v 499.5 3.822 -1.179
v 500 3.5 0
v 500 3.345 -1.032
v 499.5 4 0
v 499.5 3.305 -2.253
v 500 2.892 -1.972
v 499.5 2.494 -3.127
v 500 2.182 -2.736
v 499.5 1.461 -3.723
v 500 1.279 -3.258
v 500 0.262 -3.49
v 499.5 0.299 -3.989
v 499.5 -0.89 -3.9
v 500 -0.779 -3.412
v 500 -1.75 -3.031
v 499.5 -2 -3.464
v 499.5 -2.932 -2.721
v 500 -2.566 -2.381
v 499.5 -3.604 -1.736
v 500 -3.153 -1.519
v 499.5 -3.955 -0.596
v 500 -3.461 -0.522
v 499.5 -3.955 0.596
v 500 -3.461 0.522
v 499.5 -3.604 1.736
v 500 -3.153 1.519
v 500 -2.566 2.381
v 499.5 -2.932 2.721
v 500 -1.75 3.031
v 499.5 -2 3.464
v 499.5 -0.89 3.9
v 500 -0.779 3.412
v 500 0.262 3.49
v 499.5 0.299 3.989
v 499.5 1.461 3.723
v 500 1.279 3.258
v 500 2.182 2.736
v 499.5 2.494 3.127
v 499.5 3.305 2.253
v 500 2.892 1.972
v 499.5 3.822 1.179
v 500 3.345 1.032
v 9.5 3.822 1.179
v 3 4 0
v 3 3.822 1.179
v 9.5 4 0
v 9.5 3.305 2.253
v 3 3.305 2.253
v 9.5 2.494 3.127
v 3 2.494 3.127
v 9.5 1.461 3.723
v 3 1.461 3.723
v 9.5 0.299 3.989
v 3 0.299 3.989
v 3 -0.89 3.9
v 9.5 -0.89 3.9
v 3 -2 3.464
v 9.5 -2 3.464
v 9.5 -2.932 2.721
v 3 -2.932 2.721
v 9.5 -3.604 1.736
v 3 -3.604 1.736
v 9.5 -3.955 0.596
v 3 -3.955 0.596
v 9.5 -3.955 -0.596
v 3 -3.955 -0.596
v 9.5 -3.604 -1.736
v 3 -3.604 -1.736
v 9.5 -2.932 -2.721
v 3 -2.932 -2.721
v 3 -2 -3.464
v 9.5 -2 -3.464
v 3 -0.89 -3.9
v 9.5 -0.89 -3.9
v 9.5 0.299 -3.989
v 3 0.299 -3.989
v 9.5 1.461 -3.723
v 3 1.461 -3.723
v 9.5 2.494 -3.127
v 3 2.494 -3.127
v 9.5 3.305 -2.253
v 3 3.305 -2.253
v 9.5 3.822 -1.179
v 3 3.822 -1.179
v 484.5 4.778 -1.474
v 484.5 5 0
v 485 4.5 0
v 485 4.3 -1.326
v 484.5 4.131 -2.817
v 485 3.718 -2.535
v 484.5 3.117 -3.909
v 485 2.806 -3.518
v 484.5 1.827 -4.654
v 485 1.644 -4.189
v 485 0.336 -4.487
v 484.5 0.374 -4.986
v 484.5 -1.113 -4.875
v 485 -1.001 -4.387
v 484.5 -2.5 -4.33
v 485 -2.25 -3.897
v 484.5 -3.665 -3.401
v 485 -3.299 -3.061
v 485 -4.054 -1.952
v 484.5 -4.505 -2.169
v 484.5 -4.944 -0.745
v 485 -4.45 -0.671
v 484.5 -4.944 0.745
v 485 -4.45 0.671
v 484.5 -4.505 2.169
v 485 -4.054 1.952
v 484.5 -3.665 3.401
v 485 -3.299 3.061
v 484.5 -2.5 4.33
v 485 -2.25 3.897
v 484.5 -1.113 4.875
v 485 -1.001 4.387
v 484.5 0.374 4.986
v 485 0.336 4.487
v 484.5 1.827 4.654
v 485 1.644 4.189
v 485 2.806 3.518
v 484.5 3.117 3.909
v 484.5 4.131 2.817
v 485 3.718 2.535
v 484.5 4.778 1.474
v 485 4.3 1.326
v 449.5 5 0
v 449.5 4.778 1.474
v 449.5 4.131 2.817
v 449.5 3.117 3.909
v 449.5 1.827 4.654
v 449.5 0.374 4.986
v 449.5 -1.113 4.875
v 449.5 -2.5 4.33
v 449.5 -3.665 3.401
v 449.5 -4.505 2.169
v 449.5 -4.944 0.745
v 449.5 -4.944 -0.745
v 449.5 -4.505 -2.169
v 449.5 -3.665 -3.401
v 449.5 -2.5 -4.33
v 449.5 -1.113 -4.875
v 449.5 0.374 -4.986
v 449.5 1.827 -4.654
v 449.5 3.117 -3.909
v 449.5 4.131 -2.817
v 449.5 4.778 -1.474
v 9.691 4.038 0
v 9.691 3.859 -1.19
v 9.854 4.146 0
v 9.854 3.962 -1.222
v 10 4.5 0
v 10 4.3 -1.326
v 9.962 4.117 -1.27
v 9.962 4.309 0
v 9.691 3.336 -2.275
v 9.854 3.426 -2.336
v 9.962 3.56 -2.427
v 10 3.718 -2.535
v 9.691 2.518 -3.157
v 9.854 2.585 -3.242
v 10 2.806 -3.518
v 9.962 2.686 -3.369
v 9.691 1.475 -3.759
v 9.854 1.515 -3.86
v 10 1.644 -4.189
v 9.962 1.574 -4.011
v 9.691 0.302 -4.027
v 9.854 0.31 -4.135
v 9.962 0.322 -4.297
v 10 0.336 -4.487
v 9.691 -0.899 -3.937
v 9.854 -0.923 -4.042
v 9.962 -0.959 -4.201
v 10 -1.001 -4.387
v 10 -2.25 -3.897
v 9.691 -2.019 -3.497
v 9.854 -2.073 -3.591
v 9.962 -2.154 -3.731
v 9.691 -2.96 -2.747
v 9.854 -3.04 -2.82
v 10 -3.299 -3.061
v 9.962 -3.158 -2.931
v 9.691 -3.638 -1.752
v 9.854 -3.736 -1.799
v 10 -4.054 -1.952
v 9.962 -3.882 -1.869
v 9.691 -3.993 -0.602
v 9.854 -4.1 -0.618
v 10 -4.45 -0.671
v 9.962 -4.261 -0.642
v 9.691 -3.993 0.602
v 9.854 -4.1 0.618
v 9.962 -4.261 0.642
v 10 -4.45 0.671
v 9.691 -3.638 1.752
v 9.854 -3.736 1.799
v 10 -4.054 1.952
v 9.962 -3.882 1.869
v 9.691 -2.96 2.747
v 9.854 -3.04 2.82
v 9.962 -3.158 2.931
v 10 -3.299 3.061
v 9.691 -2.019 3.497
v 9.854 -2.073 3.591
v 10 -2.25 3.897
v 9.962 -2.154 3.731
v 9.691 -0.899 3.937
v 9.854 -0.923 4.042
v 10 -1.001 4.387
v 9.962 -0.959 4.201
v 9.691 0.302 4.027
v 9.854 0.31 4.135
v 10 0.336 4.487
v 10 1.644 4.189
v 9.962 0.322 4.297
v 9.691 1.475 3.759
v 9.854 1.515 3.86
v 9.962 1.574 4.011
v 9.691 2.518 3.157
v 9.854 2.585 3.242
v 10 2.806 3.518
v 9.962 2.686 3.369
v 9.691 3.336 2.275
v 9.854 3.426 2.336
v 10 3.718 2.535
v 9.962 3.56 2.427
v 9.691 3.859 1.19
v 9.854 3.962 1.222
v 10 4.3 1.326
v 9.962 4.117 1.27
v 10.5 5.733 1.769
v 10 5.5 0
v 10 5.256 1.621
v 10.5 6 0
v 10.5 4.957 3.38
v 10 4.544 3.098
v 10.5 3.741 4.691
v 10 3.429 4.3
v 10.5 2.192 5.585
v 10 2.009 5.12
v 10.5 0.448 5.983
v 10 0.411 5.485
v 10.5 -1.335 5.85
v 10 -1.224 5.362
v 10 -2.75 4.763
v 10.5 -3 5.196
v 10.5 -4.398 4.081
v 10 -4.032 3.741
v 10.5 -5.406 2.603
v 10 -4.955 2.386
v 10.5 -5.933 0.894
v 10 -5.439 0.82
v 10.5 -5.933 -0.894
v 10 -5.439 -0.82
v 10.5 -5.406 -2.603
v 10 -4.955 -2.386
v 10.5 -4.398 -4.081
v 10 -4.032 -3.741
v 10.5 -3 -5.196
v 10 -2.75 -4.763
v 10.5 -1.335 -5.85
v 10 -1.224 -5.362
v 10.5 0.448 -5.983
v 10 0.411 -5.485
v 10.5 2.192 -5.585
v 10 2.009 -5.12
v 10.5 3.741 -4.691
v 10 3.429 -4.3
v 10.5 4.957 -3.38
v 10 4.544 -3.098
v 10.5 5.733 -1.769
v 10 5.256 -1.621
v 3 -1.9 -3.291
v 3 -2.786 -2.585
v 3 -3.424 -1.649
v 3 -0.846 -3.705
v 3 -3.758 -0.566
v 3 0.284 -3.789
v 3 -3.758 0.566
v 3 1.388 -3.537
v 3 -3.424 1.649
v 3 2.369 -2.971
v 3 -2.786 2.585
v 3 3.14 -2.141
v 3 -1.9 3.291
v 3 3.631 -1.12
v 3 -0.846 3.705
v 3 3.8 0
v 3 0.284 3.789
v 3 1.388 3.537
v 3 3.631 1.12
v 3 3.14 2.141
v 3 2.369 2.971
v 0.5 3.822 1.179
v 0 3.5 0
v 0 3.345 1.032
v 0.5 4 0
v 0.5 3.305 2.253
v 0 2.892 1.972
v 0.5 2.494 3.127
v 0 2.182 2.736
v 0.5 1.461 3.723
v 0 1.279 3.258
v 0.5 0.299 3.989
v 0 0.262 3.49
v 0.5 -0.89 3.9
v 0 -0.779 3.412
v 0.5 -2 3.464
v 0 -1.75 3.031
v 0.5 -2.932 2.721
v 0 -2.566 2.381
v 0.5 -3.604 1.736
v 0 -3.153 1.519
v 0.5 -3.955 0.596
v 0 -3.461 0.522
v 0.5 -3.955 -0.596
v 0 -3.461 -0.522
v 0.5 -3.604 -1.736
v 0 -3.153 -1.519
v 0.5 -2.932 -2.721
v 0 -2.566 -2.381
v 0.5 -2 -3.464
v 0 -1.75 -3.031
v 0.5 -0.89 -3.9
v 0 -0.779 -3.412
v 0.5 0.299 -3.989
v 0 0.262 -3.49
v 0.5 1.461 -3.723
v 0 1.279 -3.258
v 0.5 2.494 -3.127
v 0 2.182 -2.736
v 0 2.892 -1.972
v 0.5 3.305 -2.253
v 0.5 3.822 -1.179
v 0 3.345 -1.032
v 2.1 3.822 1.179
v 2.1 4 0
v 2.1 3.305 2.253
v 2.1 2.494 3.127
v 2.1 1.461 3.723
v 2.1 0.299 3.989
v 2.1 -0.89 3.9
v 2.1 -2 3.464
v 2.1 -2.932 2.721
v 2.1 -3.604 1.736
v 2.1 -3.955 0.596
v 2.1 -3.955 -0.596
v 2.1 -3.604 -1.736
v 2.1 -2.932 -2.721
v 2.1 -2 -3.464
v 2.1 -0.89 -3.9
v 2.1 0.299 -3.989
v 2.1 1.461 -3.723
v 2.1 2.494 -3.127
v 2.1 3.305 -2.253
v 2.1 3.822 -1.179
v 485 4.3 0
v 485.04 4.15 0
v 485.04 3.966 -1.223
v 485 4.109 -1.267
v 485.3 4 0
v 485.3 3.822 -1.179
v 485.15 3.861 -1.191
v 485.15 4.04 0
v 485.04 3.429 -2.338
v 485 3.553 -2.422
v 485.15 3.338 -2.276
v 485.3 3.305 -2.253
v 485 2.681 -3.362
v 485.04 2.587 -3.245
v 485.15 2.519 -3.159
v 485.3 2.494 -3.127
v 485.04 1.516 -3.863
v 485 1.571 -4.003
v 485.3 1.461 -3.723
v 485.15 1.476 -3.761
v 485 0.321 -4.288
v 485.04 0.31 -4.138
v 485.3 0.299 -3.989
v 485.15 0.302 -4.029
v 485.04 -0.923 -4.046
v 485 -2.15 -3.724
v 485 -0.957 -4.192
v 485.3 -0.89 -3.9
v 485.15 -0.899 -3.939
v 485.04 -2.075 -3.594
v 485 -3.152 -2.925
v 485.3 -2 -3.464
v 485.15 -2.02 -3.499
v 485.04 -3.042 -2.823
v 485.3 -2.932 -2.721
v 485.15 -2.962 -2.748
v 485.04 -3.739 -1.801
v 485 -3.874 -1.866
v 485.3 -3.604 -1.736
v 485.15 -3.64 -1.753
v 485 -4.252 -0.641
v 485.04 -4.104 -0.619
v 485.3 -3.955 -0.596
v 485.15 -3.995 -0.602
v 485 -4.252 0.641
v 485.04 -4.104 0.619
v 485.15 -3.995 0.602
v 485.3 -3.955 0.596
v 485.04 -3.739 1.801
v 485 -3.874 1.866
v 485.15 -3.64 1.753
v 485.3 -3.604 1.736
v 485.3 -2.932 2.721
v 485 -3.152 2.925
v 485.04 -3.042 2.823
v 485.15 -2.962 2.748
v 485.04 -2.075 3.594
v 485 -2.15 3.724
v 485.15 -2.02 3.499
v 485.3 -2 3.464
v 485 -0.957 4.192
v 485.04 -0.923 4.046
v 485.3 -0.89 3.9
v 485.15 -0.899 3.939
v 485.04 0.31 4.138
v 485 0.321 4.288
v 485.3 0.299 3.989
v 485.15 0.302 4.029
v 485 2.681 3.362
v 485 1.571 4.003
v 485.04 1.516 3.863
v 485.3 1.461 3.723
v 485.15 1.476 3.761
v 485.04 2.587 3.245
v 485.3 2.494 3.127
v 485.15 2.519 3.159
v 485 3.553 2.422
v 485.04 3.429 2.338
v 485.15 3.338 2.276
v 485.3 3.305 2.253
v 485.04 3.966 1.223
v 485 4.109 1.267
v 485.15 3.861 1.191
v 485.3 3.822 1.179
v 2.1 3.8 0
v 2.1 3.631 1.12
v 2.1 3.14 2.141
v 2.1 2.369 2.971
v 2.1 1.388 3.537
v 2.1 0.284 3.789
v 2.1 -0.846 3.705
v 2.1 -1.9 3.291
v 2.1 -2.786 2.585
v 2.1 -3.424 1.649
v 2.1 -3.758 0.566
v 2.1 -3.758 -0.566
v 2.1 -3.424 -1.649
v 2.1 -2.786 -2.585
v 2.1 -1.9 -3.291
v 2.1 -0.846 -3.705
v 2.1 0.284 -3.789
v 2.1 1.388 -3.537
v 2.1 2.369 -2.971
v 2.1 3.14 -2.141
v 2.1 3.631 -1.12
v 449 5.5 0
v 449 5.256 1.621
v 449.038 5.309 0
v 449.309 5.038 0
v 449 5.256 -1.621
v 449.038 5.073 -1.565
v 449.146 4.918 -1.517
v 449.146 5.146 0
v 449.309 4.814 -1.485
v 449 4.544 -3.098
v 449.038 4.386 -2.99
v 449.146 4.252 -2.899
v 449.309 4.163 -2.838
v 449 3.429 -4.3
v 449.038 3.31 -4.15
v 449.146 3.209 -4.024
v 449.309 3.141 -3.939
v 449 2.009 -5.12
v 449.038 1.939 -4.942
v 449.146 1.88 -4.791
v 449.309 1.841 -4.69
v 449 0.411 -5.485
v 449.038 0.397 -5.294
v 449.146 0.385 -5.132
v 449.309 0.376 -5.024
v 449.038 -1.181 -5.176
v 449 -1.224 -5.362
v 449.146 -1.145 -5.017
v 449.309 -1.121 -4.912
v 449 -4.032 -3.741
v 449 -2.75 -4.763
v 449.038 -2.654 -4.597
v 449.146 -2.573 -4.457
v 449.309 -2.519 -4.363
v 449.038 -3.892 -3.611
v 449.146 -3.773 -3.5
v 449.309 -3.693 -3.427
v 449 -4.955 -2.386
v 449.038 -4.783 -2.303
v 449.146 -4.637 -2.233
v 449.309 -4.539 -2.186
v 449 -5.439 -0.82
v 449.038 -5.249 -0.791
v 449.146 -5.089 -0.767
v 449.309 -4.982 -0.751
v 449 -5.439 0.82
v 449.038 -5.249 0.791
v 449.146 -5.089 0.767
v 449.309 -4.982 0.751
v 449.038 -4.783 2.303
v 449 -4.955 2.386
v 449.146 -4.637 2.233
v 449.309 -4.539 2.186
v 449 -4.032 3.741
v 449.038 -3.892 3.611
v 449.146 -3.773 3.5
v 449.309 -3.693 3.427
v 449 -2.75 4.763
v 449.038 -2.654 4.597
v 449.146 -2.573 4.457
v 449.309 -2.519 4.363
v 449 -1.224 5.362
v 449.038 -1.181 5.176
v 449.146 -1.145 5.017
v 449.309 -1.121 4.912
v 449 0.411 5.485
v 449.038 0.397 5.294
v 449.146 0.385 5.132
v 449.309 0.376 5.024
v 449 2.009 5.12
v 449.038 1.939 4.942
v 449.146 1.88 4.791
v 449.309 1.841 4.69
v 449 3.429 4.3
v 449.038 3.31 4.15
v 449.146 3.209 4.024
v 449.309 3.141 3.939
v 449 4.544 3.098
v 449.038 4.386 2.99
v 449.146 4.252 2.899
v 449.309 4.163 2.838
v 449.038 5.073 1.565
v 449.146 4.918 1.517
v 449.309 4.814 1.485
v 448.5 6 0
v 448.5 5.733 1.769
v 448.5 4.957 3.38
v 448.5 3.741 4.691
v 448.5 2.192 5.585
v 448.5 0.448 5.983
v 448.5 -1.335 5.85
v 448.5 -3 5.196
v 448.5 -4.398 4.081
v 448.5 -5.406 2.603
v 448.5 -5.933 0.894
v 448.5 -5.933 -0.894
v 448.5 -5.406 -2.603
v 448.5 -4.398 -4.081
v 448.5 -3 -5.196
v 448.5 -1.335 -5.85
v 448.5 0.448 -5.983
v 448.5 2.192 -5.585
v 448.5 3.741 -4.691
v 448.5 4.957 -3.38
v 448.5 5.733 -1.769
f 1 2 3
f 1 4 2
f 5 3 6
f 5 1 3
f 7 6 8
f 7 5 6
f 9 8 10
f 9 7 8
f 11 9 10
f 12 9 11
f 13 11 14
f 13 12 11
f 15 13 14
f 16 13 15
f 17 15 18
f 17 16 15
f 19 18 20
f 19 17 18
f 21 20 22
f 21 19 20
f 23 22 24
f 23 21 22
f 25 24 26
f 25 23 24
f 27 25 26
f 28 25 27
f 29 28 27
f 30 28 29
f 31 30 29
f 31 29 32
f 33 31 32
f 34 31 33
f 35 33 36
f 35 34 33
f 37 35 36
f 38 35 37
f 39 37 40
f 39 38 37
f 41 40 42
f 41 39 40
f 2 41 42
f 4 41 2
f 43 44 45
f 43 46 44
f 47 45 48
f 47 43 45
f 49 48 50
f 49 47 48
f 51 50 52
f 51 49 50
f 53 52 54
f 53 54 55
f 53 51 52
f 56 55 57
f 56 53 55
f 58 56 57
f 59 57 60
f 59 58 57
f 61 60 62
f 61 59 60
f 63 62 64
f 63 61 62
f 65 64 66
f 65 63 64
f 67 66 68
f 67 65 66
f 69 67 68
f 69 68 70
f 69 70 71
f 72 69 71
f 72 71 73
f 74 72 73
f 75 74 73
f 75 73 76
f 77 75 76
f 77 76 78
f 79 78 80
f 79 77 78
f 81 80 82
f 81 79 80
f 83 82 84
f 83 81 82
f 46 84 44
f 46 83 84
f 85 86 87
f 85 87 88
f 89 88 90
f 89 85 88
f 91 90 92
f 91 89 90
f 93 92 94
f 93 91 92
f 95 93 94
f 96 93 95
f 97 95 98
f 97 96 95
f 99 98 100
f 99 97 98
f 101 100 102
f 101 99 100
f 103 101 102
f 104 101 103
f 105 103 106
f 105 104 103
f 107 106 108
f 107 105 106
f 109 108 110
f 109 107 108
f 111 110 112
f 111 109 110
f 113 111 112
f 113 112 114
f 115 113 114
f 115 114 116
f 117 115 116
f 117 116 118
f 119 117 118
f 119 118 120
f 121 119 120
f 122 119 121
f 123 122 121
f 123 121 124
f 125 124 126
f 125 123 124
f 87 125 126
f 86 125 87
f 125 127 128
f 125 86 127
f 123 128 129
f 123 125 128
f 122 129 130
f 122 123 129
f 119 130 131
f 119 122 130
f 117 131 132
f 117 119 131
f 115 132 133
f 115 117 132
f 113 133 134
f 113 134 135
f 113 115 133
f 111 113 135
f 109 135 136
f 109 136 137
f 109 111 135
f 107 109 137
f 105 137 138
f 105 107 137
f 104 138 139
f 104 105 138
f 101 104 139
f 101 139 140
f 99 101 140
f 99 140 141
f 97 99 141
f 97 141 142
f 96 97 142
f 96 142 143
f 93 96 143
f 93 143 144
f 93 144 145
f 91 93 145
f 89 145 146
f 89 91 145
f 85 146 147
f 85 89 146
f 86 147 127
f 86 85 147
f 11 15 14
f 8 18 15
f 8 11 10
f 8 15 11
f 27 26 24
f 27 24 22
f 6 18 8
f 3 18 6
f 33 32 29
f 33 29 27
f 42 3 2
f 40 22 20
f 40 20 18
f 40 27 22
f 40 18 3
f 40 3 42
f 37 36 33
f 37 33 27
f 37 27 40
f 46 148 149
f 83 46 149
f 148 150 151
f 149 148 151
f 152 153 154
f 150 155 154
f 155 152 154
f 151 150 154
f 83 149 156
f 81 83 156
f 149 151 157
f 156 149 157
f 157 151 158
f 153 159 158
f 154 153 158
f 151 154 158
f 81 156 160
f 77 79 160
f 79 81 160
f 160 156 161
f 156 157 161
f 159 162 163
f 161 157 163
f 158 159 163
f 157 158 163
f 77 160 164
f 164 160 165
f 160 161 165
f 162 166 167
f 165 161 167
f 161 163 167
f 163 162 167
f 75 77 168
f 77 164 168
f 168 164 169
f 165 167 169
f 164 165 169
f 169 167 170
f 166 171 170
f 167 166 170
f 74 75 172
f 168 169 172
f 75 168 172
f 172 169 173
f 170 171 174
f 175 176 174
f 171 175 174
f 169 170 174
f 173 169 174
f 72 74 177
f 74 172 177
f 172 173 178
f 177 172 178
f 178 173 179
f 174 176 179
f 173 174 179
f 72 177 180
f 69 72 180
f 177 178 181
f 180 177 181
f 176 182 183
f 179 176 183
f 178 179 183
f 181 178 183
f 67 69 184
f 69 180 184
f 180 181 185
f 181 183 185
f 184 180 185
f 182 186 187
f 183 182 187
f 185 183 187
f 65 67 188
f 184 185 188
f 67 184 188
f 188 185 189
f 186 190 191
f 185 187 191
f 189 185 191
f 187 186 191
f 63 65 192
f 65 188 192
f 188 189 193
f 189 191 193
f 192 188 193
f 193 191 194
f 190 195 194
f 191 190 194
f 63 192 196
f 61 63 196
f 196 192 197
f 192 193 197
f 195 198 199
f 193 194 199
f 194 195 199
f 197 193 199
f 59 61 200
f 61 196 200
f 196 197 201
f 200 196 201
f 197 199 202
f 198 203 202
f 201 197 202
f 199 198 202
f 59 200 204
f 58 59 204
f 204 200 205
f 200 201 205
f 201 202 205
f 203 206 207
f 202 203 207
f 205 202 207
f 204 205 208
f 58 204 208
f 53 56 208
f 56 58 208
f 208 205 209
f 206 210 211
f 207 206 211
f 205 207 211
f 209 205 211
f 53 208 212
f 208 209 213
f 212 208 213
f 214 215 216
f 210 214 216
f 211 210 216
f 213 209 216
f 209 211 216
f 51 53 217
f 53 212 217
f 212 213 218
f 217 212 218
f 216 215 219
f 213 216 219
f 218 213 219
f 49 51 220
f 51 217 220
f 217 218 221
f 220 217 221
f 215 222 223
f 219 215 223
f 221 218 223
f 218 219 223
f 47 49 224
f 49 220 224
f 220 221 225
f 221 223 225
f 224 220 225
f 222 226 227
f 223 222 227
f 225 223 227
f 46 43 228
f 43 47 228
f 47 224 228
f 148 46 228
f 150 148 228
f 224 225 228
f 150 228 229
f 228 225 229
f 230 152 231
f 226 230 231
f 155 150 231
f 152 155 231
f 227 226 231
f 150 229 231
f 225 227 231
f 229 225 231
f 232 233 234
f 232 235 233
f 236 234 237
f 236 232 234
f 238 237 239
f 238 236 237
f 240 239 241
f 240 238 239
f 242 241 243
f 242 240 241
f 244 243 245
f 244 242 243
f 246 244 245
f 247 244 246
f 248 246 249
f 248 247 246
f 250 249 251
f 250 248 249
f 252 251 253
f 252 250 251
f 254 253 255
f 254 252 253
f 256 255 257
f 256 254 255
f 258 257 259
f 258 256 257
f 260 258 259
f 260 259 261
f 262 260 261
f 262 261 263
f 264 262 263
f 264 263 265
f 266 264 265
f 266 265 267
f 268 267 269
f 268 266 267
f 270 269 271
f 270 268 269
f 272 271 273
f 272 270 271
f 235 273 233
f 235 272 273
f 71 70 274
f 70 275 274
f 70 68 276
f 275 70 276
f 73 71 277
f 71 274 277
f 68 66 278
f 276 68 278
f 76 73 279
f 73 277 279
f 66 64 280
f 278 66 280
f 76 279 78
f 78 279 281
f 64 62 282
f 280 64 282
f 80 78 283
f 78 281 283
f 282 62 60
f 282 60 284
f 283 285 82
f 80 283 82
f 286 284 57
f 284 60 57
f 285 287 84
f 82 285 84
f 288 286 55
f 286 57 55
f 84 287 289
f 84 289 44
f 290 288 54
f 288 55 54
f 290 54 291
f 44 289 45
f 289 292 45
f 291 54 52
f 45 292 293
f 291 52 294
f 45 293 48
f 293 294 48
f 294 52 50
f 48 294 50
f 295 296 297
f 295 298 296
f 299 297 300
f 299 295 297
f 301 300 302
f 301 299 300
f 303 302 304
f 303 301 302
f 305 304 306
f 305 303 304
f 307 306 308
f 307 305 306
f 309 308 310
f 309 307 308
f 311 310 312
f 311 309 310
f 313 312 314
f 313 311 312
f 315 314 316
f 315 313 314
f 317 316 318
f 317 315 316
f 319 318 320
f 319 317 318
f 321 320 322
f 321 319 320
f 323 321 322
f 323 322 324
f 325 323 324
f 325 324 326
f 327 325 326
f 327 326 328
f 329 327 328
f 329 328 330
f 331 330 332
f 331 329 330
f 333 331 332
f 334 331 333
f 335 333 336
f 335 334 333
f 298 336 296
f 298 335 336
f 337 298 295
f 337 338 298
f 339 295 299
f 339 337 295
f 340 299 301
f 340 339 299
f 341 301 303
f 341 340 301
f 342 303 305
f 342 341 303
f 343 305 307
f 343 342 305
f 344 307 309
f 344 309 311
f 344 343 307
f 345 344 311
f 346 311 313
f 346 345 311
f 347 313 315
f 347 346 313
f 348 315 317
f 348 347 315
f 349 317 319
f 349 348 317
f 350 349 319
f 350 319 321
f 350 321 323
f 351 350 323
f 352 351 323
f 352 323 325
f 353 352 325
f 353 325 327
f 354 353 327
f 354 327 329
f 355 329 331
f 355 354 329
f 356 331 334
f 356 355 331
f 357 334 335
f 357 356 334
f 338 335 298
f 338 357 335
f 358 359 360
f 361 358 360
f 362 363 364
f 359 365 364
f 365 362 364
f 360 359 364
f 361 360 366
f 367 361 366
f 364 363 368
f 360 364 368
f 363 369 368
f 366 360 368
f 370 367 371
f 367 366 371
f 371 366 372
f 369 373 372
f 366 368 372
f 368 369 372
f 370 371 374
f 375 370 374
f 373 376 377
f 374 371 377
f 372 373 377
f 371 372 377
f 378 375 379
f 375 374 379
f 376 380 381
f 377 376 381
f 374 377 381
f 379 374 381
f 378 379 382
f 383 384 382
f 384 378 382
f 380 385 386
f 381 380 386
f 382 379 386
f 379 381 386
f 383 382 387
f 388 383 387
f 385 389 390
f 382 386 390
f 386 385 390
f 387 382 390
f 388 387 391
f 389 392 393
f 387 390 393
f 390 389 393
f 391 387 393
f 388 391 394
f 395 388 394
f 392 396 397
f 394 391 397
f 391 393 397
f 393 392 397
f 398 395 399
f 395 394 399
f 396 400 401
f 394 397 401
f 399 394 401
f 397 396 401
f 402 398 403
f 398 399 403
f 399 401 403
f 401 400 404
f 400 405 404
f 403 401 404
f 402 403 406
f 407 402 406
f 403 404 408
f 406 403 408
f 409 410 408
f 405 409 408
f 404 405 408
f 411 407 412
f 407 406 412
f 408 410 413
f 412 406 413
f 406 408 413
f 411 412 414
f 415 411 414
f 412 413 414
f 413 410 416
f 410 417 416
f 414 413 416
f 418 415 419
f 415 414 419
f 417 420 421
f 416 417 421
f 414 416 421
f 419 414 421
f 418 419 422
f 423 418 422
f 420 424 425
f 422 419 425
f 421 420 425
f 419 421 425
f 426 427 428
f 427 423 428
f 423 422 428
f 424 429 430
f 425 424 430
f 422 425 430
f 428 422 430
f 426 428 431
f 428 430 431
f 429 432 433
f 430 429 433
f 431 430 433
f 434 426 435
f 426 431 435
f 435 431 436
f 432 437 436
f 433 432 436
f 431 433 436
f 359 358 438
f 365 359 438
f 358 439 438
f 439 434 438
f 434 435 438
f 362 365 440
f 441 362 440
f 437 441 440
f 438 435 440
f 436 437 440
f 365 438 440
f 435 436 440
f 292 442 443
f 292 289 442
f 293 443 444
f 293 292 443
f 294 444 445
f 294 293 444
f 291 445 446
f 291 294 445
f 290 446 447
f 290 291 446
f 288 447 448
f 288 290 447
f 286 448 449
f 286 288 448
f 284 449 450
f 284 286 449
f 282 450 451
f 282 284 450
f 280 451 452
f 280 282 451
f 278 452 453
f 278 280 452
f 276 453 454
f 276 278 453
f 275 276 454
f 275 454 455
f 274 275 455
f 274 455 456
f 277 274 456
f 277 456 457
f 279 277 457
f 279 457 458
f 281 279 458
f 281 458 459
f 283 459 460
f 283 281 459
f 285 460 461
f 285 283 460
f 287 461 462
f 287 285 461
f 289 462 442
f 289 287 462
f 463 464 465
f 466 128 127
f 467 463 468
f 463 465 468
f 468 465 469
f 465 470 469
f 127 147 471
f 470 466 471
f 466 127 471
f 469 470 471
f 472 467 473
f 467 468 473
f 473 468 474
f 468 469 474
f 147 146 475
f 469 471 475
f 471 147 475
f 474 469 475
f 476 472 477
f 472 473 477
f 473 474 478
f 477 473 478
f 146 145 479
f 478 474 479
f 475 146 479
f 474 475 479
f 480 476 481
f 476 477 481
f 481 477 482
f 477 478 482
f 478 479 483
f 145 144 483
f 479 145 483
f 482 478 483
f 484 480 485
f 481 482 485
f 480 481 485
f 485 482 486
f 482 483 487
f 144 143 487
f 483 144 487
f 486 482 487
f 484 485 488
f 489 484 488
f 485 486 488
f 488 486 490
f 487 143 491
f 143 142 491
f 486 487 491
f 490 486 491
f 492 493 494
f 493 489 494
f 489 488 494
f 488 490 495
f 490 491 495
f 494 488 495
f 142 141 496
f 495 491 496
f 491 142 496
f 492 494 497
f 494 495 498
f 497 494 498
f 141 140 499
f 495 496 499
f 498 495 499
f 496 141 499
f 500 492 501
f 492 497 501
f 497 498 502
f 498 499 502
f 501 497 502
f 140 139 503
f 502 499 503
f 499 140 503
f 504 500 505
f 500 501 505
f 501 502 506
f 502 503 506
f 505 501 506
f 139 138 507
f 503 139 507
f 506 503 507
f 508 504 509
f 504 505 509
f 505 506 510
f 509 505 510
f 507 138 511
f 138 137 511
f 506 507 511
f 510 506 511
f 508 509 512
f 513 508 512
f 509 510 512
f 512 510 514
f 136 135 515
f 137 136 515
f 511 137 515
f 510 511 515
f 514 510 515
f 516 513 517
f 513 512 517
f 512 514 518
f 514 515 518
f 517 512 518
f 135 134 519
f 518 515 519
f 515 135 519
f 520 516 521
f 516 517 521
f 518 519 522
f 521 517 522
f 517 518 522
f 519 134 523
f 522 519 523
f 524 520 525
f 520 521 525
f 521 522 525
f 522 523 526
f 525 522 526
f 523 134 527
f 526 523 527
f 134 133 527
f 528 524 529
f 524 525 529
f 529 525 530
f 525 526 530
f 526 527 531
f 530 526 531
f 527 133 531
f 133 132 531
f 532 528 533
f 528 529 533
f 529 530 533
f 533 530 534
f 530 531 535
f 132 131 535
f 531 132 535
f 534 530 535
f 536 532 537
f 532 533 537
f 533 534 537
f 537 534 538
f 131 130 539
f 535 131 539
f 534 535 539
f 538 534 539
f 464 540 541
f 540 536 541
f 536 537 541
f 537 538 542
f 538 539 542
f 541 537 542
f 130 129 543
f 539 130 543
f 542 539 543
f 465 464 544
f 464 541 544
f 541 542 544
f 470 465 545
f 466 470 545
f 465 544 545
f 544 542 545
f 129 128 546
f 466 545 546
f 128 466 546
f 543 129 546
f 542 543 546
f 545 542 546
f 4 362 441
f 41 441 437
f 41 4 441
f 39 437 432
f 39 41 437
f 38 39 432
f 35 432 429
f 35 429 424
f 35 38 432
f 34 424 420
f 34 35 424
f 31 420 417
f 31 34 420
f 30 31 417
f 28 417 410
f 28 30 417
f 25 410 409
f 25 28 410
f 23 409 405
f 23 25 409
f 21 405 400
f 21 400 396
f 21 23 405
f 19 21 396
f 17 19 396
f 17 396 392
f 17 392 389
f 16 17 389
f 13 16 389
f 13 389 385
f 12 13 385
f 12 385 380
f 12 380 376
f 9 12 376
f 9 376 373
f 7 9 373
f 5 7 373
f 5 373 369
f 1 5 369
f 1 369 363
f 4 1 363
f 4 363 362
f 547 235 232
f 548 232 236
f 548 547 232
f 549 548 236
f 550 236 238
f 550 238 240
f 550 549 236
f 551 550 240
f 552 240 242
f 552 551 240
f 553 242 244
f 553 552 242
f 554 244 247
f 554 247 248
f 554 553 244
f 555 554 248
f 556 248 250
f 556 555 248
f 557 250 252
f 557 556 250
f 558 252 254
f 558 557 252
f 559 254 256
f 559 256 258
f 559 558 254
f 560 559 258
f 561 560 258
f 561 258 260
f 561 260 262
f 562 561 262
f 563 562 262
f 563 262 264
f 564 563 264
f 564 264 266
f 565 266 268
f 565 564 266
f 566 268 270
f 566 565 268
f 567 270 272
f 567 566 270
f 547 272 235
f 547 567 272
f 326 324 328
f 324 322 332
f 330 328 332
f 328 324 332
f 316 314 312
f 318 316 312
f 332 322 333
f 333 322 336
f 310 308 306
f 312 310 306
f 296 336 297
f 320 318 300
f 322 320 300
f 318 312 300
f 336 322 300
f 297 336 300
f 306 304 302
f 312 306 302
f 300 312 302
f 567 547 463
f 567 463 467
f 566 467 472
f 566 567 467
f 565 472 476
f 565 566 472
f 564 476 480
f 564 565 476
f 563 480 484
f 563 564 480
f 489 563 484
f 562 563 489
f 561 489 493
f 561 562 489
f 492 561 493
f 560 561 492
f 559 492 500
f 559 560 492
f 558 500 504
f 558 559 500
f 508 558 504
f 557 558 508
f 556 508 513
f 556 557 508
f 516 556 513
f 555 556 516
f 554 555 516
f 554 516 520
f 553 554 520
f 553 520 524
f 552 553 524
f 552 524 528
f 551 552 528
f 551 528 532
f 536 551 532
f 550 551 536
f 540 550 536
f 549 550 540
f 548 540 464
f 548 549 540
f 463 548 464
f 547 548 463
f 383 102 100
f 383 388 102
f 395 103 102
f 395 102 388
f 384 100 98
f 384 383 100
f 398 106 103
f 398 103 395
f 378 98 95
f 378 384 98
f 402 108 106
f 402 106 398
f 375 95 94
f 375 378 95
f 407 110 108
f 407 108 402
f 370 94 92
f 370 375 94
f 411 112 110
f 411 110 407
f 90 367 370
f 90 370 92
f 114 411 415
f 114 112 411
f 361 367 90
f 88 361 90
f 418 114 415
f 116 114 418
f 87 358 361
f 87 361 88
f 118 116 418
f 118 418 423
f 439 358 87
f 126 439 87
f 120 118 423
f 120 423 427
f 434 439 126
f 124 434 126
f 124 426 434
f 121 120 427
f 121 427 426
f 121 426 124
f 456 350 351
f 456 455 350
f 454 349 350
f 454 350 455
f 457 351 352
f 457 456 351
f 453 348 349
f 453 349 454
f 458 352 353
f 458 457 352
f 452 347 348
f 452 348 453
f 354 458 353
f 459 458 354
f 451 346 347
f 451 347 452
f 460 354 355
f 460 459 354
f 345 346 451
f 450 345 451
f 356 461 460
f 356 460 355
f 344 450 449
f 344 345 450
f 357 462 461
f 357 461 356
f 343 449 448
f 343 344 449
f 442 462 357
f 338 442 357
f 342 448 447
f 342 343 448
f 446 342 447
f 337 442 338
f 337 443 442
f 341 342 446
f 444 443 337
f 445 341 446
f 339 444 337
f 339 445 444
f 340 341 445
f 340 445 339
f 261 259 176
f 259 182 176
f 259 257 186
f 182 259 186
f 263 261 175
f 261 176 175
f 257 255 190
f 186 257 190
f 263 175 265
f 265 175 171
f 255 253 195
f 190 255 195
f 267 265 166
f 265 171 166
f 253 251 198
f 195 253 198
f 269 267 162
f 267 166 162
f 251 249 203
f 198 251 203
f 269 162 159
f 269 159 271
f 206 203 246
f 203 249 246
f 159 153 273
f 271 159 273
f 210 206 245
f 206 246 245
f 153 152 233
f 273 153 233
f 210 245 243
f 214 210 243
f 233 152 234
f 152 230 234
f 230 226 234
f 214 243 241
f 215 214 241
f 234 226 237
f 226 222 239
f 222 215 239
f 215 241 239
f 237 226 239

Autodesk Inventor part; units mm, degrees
sketch "Sketch_1" plane through (0, 0, 0) normal (0, 0, 1) x (1, 0, 0)
  line L0 (449.5, 0) -> (0, 0)
  line L1 (0, 0) -> (0, 3.5)
  line L2 (0, 3.5) -> (0.5, 4)
  line L3 (0.5, 4) -> (2.1, 4)
  line L4 (2.1, 4) -> (2.1, 3.8)
  line L5 (2.1, 3.8) -> (3, 3.8)
  line L6 (3, 3.8) -> (3, 4)
  line L7 (3, 4) -> (9.5, 4)
  arc A0 (9.5, 4) -> (10, 4.5) centre (9.5, 4.5) ccw
  line L8 (10, 4.5) -> (10, 5.5)
  line L9 (10, 5.5) -> (10.5, 6)
  line L10 (10.5, 6) -> (448.5, 6)
  line L11 (448.5, 6) -> (449, 5.5)
  arc A1 (449, 5.5) -> (449.5, 5) centre (449.5, 5.5) ccw
  line L12 (449.5, 5) -> (449.5, 0)
  line L13 (449.5, 0) -> (0, 0)
revolve "Revolution1" add sketch "Sketch_1" angle 360 about axis through (449.5, 0, 0) along (1, 0, 0)
thread "Thread1" size "M12x1.5" class "6g" standard "ISO Metric profile" full length
sketch "_____2" plane through (0, 0, 0) normal (0, 0, 1) x (1, 0, 0)
  line L0 (500, 0) -> (449.5, 0)
  line L1 (449.5, 0) -> (449.5, 5)
  line L2 (449.5, 5) -> (484.5, 5)
  line L3 (484.5, 5) -> (485, 4.5)
  line L4 (485, 4.5) -> (485, 4.3)
  arc A0 (485, 4.3) -> (485.3, 4) centre (485.3, 4.3) ccw
  line L5 (485.3, 4) -> (499.5, 4)
  line L6 (499.5, 4) -> (500, 3.5)
  line L7 (500, 3.5) -> (500, 0)
  line L8 (500, 0) -> (449.5, 0)
revolve "Revolution2" add sketch "_____2" angle 360 about axis through (500, 0, 0) along (1, 0, 0)
thread "Thread2" size "M10x1" class "6g" standard "ISO Metric profile" length 10.5
ref_plane "to_collar_XY" through (449, 0, 0) normal (1, 0, 0) x (0, 0, -1)
ref_plane "to_collar_YZ" through (449, 0, 0) normal (0, 0, -1) x (0, 1, 0)
ref_plane "to_collar_ZX" through (449, 0, 0) normal (0, 1, 0) x (1, 0, 0)
ref_plane "to_dummy_XY" through (10, 0, 0) normal (1, 0, 0) x (0, 0, -1)
ref_plane "to_dummy_YZ" through (10, 0, 0) normal (0, 0, -1) x (0, 1, 0)
ref_plane "to_dummy_ZX" through (10, 0, 0) normal (0, 1, 0) x (1, 0, 0)
ref_plane "to_nut_XY" through (229.5, 0, 0) normal (1, 0, 0) x (0, 0, -1)
ref_plane "to_nut_YZ" through (229.5, 0, 0) normal (0, 0, -1) x (0, 1, 0)
ref_plane "to_nut_ZX" through (229.5, 0, 0) normal (0, 1, 0) x (1, 0, 0)
properties part number "C-TBSE1204-500_t"
